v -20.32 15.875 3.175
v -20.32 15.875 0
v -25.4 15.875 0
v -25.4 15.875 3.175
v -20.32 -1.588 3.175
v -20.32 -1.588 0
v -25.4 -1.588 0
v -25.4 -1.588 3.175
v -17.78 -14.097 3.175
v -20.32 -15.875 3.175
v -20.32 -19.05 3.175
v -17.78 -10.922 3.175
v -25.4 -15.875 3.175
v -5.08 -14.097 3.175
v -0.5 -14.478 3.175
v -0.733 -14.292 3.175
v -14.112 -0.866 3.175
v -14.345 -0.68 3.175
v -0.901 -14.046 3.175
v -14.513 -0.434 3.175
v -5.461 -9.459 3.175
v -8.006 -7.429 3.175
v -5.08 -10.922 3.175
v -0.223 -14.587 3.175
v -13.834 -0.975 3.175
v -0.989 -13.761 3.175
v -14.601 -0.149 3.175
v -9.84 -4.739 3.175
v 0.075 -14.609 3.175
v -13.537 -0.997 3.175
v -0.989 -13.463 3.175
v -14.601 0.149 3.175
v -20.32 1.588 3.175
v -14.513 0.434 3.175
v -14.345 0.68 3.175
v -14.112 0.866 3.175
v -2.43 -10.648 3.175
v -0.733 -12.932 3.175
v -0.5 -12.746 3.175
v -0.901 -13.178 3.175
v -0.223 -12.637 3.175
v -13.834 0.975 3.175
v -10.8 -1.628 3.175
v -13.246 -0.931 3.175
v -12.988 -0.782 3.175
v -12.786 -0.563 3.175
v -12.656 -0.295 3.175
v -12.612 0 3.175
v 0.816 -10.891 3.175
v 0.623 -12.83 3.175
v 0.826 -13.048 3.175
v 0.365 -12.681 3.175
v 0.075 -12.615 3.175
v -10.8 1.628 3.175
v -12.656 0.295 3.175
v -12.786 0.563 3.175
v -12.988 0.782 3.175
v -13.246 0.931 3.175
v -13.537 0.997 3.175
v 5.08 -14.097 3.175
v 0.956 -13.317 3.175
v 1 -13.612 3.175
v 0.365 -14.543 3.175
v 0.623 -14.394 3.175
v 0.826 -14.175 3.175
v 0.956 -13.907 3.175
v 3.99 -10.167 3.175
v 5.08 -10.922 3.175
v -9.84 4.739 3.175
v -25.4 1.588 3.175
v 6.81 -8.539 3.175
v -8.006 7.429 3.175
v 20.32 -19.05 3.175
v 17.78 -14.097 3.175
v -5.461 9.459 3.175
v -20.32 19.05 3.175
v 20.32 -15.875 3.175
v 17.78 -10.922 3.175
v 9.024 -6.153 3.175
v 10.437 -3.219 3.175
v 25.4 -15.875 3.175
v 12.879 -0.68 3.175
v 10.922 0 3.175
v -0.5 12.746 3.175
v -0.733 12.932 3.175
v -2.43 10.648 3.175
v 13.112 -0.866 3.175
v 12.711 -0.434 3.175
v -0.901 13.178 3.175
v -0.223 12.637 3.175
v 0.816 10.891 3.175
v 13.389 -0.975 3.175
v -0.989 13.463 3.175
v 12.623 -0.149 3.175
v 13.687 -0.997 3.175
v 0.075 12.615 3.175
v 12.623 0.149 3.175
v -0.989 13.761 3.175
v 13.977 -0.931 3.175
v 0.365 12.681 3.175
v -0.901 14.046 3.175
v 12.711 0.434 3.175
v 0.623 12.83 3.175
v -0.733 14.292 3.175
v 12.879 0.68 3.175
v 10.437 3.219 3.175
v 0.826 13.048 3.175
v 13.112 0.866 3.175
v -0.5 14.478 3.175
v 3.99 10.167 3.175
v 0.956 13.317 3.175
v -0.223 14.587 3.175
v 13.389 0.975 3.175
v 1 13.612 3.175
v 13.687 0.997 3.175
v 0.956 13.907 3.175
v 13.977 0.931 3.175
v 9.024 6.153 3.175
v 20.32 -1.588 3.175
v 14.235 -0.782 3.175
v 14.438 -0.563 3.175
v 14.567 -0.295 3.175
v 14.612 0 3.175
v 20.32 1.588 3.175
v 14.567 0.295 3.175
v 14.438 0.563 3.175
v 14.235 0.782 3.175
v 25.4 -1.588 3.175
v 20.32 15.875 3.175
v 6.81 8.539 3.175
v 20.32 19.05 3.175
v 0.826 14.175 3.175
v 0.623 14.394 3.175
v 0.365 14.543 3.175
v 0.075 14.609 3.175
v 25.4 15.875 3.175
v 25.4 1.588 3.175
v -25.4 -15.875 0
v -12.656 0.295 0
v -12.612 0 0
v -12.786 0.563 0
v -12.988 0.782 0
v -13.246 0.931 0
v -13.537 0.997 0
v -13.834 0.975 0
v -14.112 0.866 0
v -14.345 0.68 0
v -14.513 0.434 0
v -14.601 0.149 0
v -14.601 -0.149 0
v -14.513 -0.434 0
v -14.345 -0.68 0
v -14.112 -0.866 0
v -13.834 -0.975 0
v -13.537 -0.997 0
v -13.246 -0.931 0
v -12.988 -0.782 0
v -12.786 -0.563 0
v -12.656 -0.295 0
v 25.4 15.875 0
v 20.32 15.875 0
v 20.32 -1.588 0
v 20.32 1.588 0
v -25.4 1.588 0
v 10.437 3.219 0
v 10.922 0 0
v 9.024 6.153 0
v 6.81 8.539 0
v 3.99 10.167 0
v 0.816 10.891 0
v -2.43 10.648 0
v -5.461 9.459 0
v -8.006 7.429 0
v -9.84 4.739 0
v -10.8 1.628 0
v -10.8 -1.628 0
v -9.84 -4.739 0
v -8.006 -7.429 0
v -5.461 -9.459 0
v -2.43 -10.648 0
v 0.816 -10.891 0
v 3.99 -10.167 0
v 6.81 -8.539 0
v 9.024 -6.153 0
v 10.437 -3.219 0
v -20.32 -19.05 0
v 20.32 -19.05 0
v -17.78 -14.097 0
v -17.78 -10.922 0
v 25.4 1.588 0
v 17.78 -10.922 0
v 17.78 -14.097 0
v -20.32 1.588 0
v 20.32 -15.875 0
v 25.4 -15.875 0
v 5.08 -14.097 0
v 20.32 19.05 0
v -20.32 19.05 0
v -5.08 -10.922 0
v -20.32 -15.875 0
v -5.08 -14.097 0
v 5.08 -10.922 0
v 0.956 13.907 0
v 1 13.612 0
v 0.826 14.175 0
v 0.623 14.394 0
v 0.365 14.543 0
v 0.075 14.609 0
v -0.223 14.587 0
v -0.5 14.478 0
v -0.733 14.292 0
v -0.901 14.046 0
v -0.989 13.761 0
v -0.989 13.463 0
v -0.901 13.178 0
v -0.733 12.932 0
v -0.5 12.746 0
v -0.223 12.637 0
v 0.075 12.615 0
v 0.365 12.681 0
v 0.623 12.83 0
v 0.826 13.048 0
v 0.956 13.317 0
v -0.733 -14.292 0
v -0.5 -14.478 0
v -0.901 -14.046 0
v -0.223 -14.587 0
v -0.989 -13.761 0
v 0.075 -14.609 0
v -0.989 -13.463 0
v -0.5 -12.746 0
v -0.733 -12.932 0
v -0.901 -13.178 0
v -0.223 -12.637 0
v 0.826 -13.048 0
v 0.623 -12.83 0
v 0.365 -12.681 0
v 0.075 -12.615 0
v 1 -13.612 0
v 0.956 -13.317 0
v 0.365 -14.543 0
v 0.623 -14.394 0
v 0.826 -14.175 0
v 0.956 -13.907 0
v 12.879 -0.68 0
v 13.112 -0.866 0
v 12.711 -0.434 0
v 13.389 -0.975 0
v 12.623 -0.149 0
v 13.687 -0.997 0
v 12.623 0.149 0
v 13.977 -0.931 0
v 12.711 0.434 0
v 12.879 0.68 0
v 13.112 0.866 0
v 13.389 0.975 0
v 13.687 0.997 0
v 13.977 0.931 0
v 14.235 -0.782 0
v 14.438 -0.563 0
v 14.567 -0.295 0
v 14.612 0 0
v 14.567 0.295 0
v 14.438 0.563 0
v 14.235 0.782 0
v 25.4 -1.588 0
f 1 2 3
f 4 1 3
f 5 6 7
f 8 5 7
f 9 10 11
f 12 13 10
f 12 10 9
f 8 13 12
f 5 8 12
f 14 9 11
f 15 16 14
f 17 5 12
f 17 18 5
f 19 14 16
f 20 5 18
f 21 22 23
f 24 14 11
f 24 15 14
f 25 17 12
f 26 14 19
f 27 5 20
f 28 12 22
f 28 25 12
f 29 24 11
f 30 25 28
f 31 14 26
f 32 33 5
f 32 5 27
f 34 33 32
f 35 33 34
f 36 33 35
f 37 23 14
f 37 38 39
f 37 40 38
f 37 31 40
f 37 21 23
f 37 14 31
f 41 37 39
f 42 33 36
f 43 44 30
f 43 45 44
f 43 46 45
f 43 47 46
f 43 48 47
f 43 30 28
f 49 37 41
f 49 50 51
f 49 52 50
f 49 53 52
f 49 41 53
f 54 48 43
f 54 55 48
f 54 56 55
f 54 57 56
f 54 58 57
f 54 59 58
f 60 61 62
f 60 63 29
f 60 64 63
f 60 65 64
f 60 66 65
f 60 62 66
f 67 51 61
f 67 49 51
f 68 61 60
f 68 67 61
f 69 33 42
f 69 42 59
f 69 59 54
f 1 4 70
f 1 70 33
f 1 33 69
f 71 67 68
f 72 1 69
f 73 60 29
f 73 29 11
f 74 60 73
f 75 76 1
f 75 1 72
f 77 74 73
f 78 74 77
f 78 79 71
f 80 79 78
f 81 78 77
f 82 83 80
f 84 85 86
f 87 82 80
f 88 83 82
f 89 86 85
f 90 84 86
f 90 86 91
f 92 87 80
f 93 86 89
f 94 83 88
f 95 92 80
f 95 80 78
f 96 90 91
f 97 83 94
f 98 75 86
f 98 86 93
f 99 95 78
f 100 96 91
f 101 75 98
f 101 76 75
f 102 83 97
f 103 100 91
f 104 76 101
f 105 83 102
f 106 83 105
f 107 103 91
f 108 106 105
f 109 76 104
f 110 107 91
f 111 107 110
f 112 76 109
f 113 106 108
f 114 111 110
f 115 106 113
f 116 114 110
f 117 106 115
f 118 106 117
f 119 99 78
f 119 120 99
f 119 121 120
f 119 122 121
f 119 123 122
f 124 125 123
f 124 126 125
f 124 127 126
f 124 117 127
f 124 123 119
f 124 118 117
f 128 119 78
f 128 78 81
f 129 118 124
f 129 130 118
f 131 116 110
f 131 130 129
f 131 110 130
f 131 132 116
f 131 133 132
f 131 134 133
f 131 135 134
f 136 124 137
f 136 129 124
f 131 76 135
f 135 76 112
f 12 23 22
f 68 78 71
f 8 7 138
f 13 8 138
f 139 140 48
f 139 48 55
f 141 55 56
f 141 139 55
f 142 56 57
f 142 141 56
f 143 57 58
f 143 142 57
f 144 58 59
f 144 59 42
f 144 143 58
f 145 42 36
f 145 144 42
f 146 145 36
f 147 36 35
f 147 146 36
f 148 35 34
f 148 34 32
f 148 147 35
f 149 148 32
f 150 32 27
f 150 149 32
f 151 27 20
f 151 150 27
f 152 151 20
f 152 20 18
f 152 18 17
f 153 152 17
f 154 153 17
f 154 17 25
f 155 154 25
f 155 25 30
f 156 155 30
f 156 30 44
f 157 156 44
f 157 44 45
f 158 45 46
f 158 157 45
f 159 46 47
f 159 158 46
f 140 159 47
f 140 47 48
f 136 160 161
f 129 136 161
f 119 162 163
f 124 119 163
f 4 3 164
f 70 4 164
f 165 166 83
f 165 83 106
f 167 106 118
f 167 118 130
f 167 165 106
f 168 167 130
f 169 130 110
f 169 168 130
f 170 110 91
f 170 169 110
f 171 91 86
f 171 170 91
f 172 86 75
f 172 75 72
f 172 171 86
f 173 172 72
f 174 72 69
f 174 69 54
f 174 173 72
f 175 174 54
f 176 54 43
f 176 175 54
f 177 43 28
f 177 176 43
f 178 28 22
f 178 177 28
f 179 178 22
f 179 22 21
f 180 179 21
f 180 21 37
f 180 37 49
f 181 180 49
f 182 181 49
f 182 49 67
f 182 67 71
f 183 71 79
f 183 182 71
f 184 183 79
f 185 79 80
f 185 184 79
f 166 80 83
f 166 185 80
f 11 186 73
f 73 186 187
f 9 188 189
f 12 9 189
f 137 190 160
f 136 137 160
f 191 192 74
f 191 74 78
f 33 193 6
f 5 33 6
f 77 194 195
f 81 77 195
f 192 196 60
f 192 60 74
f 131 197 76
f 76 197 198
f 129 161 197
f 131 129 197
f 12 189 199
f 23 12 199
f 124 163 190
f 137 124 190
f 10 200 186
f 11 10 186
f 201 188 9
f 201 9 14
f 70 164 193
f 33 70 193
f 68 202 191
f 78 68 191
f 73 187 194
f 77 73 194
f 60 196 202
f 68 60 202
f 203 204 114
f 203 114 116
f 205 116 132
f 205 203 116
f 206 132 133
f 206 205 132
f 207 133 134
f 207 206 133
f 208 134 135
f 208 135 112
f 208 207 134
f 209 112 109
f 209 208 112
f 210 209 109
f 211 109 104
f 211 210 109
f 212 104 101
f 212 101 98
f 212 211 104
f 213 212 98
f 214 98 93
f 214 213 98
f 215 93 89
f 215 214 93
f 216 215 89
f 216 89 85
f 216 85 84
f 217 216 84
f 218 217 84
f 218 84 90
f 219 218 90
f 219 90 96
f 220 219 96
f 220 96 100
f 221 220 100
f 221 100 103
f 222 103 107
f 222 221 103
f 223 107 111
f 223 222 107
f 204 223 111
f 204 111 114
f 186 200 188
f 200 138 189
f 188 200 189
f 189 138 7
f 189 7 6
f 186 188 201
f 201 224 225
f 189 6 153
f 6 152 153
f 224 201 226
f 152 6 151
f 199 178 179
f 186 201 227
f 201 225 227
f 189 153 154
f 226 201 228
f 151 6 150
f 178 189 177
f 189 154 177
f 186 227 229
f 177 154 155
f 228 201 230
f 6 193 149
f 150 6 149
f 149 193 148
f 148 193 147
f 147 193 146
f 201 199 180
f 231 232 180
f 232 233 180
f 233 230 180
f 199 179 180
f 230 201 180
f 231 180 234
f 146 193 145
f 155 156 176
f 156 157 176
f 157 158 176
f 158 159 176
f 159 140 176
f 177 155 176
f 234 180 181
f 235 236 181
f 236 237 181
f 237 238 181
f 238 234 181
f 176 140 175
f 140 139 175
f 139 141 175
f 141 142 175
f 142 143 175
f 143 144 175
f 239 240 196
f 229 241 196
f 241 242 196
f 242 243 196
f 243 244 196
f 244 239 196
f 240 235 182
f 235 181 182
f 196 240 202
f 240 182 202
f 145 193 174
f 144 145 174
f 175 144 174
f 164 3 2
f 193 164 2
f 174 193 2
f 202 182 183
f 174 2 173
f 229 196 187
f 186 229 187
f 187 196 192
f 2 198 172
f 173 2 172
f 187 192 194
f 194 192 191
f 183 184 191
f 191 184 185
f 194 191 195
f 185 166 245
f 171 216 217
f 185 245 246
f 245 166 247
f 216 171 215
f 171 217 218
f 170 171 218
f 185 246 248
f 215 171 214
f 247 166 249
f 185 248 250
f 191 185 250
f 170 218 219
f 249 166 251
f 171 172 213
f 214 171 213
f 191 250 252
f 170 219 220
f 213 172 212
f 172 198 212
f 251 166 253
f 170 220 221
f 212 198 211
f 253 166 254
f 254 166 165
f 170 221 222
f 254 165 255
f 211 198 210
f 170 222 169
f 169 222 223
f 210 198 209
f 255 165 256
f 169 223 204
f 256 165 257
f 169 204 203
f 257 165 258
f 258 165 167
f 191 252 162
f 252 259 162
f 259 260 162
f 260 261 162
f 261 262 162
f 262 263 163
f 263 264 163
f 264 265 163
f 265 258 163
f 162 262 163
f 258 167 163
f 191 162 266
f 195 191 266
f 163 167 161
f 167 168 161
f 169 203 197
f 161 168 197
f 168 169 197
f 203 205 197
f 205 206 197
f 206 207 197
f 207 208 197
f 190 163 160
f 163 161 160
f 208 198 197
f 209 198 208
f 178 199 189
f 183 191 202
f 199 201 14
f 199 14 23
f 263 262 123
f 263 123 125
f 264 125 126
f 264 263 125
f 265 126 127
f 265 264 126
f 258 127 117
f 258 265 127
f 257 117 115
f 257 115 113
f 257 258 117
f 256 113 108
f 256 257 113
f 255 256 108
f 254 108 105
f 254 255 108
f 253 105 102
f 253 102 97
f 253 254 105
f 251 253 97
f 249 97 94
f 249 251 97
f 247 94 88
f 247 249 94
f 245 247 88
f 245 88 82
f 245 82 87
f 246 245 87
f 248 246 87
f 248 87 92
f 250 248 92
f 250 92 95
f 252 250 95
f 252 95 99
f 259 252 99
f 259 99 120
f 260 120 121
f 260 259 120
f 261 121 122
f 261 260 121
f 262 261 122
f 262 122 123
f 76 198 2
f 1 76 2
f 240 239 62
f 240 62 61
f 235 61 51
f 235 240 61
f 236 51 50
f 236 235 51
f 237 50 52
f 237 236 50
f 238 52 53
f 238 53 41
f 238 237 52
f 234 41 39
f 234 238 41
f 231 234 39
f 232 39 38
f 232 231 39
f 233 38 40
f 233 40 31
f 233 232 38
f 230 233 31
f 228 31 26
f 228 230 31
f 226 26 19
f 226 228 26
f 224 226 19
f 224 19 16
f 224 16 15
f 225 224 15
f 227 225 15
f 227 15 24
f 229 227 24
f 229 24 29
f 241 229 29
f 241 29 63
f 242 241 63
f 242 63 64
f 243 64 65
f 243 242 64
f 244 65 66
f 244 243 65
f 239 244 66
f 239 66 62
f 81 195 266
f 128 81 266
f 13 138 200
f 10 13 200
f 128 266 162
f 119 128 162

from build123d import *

# Parameters (mm, degrees)
SKETCH3_W           = 12.7
SKETCH3_H           = 3.175
SKETCH3_R           = 0.999998
SKETCH3_R_2         = 10.922
BOSS_EXTRUDE1_DEPTH = 3.175


with BuildPart() as part:
    # Sketch3 → Boss-Extrude1 (new body)
    with BuildSketch(Plane.XY):
        Polygon((-20.32, -15.875), (-20.32, -19.05), (20.32, -19.05), (20.32, -15.875), (25.4, -15.875), (25.4, -1.5875), (20.32, -1.5875), (20.32, 1.5875), (25.4, 1.5875), (25.4, 15.875), (20.32, 15.875), (20.32, 19.05), (-20.32, 19.05), (-20.32, 15.875), (-25.4, 15.875), (-25.4, 1.5875), (-20.32, 1.5875), (-20.32, -1.5875), (-25.4, -1.5875), (-25.4, -15.875), align=None)
        with Locations((-11.43, -12.5095)):
            Rectangle(SKETCH3_W, SKETCH3_H, mode=Mode.SUBTRACT)
        with Locations((0, -13.611800056)):
            Circle(SKETCH3_R, mode=Mode.SUBTRACT)
        with Locations((11.43, -12.5095)):
            Rectangle(SKETCH3_W, SKETCH3_H, mode=Mode.SUBTRACT)
        with Locations((0, -5.6e-08)):
            Circle(SKETCH3_R_2, mode=Mode.SUBTRACT)
        with Locations((-13.611800056, 0)):
            Circle(SKETCH3_R, mode=Mode.SUBTRACT)
        with Locations((13.611800056, 0)):
            Circle(SKETCH3_R, mode=Mode.SUBTRACT)
        with Locations((0, 13.611800056)):
            Circle(SKETCH3_R, mode=Mode.SUBTRACT)
    extrude(amount=BOSS_EXTRUDE1_DEPTH)


solid = part.part
